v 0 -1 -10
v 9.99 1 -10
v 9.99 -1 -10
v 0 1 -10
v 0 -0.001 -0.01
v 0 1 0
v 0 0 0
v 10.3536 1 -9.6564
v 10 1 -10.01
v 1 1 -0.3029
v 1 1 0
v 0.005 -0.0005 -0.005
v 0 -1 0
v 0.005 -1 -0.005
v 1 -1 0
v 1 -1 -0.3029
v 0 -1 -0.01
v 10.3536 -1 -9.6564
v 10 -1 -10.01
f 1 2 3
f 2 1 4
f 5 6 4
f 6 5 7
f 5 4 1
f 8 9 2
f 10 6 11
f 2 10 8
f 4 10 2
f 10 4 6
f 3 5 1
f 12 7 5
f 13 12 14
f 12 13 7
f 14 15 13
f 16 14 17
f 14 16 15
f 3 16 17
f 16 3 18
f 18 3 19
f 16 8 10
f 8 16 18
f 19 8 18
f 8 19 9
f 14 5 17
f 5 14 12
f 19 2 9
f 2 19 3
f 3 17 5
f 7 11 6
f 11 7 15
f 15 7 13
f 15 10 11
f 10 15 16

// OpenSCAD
/////////////////////////////////////////////////
module Corte(A,B){


    r=0.3;
    g=0.1;
    b=0.2;
    

    ax=-atan2((B/2.0),A);
    ay=0;
    az=0;
        
    
    
    rotate(a=[ax,ay,az])
    {
        color( c = [r, g, b], alpha = 0.9 )
        {
            translate([-A/2.0,-B,0])
            {
                cube([2*A,B,A*1.1]);
            }
        }
    }

}
/////////////////////////////////////////////////
module Base(A,B){
    r=0.1;
    g=0.1;
    b=0.3;
    
    ax=0;
    ay=0;
    az=0;
            
    rotate(a=[ax,ay,az])
    {
        color( c = [r, g, b], alpha = 0.9 )
        {
            translate([0,0,0])
            {
                cube([A,B,A]);
            }
        }
    }

}
/////////////////////////////////////////////////
module Nucleo(A,B){
    difference(){
        Base(A,B);
        Corte(A,B);
    }
}
/////////////////////////////////////////////////
module Corte_Superior(A,B){
    rotate(a=[90,0,0])
    {
        linear_extrude(height = B*3, center=true)
        {
            h=1.0;
            polygon(points=[[0-h,A+h],[A+h,A+h],[A+h,0-h],[0-h,A+h]]);
        }
    }
}
///////////////////////////////////////////////////////////////////
module inferior(A,B){
    difference(){
        Nucleo(A,B);
        Corte_Superior(A,B);
    }
}

////////////////////////////////////////////////////////////////////////

module superior(A,B,P){
    difference(){
        translate([0,0,A-0.01])
            {
            rotate(a=[0,45,0])
                {
                cube([sqrt(2*A*A),B,P]);
                }
            }
            translate([0,0,A+P/2.0])
            {
                    cube([sqrt(2*A*A),3*B,P], center=true);
            }
        }
}

///////////////////////////////////////////////////////////////////////
module completo(A,B,P){
    translate([0,-B/2,0])
    {
    union()
    {
        inferior(A,B);
        superior(A,B,P);
    }
    }
}

////////////////////////////////////////////////////////////////////////
module Prisma(pm,B,A){
translate([0,0,A-pm])
    {
        rotate(a=[90,0,0])
        {
            linear_extrude(height = B, center=true)
            {
                polygon(points=[[0,pm],[pm,pm],[pm,0],[0,pm]]);
            }
        }
    }
}
///////////////////////////////////////////////////////////////////

A=10;
B=2;
P=0.5;
pm=1.0;

translate([0,0,-A])
{
    color([0.5, 0.5, 0.8], alpha=0.5) // Color azul claro con opacidad
    union()
    {
        completo(A,B,P);
        Prisma(pm,B, A);
    }
}
